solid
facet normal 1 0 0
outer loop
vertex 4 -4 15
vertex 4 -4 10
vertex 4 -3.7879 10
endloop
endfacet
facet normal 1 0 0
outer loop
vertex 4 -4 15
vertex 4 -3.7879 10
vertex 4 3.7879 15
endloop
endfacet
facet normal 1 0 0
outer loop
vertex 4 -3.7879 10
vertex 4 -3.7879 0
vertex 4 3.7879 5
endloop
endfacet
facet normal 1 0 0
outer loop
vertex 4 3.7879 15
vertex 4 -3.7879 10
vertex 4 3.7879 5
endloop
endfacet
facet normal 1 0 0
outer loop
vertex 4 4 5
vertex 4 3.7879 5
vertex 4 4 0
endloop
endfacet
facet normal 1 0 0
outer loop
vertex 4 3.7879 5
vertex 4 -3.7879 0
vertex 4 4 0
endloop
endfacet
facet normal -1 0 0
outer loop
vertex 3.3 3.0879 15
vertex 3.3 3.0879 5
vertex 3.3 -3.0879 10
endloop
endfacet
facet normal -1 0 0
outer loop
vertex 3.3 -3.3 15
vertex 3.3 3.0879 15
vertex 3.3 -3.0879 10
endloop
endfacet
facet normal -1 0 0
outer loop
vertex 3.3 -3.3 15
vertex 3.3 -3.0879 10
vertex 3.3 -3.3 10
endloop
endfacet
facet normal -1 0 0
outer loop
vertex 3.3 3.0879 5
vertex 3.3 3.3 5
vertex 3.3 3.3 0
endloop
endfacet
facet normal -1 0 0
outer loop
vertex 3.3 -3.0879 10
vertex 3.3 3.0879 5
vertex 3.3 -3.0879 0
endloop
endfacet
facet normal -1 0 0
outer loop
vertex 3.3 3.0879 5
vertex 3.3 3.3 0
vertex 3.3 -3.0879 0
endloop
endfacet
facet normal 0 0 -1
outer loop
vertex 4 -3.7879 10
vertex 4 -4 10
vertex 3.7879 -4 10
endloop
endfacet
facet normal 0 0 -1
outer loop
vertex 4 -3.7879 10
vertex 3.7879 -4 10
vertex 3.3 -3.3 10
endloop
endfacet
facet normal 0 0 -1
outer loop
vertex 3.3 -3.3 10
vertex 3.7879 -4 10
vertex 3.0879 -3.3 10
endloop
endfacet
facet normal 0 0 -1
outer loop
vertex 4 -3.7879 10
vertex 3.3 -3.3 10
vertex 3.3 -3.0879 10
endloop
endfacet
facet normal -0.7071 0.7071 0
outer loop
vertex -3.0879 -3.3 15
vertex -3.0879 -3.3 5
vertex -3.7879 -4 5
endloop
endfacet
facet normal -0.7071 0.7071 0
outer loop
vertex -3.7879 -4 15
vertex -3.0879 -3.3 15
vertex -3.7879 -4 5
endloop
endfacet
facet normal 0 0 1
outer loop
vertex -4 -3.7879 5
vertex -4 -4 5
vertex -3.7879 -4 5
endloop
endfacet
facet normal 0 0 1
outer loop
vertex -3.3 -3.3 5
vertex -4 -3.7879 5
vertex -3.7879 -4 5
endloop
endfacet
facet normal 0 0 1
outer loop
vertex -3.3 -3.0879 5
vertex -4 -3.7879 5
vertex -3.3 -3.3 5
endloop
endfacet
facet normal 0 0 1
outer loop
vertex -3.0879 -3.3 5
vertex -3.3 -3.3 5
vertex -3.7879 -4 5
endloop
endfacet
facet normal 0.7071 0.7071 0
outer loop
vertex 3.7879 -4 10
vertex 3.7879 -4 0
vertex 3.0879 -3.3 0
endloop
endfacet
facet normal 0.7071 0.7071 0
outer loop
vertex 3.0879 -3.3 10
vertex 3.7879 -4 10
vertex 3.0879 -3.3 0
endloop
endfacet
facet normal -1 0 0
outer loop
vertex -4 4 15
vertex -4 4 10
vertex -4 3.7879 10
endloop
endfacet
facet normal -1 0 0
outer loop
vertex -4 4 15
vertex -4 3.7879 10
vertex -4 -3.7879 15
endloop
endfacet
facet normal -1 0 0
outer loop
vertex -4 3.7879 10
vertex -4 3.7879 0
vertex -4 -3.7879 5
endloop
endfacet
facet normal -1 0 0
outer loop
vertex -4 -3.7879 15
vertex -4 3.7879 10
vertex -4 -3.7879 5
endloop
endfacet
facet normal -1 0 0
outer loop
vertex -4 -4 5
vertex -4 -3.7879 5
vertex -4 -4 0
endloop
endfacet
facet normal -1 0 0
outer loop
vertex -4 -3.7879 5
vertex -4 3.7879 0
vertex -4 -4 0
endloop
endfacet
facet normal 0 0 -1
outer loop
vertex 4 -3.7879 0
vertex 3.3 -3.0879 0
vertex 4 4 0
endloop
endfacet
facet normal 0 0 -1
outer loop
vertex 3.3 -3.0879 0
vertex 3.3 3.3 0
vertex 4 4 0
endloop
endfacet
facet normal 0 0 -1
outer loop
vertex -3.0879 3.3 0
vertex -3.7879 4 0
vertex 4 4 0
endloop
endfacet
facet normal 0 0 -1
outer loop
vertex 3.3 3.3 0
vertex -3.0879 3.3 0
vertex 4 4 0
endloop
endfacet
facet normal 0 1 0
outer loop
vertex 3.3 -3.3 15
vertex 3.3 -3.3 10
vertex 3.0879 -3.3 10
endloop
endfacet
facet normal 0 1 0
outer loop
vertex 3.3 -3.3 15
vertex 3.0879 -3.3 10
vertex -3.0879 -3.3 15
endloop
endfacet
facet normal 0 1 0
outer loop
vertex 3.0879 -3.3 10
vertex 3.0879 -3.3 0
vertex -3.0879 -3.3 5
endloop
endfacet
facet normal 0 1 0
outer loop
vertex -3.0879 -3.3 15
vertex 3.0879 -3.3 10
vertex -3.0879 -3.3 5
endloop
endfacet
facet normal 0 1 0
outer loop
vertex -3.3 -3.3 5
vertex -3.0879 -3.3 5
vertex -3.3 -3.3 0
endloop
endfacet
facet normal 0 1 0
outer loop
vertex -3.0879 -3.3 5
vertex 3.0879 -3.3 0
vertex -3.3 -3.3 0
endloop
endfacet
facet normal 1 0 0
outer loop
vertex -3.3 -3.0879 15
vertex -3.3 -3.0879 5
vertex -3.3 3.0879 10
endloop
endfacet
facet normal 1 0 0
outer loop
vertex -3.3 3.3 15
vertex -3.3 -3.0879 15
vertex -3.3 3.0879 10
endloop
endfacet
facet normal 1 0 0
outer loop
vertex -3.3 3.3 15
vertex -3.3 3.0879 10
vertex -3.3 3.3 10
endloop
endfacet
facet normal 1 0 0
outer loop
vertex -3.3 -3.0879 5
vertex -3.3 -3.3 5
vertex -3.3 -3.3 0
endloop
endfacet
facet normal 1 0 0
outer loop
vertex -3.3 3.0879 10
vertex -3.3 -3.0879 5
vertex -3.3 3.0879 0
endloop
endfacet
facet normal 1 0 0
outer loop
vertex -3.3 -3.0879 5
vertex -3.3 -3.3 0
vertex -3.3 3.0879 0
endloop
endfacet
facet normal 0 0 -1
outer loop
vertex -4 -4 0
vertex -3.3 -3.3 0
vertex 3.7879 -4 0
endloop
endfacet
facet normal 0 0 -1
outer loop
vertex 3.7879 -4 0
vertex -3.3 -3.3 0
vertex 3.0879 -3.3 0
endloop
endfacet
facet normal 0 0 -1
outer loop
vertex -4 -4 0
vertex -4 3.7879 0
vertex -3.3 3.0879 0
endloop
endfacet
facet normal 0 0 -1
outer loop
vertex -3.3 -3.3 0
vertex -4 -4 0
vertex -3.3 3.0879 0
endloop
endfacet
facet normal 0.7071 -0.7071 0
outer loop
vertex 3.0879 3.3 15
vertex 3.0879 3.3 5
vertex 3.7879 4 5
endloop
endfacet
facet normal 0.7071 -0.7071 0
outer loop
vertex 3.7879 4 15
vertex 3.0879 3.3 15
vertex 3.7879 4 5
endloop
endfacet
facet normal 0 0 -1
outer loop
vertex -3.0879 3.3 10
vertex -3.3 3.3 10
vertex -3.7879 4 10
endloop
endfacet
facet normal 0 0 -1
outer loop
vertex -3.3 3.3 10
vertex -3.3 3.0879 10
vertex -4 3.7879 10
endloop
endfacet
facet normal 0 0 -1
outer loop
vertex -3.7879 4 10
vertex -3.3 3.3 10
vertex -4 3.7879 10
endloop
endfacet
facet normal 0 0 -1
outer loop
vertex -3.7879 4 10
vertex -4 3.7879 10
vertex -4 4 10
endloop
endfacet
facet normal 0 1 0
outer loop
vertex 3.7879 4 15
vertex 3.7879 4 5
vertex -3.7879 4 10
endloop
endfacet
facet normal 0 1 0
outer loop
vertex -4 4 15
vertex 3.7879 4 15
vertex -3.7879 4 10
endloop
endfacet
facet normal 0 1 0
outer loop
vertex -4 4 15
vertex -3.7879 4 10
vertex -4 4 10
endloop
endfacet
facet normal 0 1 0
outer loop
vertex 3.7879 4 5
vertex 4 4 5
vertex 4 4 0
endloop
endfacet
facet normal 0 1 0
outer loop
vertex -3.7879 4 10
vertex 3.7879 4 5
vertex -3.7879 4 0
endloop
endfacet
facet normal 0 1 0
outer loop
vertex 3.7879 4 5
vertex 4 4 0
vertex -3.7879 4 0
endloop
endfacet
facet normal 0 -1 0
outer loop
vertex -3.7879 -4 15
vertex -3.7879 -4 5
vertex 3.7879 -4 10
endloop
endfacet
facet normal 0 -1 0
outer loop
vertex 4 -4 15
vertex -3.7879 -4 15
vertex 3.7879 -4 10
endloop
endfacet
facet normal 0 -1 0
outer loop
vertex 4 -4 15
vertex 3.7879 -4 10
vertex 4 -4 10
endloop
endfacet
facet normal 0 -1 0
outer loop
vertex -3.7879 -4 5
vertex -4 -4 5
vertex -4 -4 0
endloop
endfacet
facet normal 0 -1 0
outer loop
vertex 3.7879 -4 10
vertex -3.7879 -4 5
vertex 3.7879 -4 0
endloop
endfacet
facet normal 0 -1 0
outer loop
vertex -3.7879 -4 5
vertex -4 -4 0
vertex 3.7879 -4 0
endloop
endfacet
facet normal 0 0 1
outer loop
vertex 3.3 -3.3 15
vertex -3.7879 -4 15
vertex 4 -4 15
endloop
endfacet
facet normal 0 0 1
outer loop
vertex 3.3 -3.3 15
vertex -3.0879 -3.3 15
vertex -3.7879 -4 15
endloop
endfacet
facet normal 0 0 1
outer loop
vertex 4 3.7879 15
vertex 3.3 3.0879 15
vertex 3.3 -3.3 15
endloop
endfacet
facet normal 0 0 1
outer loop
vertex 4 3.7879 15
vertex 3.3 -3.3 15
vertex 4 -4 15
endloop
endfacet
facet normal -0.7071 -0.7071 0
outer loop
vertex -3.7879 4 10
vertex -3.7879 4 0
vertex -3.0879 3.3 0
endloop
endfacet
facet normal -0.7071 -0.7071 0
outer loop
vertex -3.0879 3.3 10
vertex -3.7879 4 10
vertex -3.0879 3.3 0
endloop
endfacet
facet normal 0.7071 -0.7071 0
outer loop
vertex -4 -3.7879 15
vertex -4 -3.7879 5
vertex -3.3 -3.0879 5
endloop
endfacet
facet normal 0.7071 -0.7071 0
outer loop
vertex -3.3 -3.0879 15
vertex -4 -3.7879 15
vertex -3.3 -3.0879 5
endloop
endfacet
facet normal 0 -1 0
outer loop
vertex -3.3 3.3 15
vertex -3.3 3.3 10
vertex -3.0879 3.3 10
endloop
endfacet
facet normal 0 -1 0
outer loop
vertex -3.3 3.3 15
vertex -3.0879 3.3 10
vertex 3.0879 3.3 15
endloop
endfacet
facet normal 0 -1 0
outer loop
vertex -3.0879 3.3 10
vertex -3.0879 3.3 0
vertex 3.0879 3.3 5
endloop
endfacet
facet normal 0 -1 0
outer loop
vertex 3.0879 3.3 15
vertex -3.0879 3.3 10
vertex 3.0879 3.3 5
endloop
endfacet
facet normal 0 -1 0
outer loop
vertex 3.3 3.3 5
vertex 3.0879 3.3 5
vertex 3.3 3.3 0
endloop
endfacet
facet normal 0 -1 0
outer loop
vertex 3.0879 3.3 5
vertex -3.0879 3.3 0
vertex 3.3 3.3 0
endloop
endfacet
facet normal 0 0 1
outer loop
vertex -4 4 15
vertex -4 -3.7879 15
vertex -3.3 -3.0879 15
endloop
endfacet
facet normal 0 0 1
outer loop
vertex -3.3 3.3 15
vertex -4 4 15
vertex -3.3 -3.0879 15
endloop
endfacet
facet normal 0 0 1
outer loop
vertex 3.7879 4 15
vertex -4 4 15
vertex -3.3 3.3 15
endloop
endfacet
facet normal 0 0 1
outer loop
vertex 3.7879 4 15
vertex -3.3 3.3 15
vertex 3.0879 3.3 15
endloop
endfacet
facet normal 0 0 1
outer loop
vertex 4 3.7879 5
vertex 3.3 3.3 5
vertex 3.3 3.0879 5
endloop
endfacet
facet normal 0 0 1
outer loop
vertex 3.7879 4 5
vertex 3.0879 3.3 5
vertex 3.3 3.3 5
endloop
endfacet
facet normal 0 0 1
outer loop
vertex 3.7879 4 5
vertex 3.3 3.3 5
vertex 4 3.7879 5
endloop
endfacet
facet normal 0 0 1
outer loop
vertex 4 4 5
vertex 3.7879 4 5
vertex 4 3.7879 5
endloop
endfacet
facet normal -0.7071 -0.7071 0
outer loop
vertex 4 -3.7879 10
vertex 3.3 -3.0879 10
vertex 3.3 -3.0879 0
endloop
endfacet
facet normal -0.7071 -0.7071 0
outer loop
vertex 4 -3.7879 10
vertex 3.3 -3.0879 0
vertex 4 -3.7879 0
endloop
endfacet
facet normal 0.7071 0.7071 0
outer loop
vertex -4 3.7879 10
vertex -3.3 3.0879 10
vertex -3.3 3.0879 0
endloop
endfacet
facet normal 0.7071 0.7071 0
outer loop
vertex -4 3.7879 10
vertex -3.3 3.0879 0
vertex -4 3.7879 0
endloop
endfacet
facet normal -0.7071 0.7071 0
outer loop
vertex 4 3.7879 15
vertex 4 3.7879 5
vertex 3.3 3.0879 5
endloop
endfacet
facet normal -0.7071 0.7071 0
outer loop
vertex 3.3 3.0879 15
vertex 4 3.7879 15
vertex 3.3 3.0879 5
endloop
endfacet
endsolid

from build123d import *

# Parameters (mm, degrees)
F1_DEPTH = 15
F2_DEPTH = 5
F4_ANGLE = 90


with BuildPart() as f1:
    # F0 (on Top) → F1 (new body)
    with BuildSketch(Plane.XY):
        Polygon((-4, 4), (-4, -3.7878679656), (-3.3, -3.0878679656), (-3.3, 3.3), (3.0878679656, 3.3), (3.7878679656, 4), align=None)
        Polygon((-3.7878679656, -4), (4, -4), (4, 3.7878679656), (3.3, 3.0878679656), (3.3, -3.3), (-3.0878679656, -3.3), align=None)
    extrude(amount=F1_DEPTH)

    # F0 (on Top) → F2 (join)
    with BuildSketch(Plane.XY):
        Polygon((-4, -4), (-3.7878679656, -4), (-3.0878679656, -3.3), (-3.3, -3.3), (-3.3, -3.0878679656), (-4, -3.7878679656), align=None)
        Polygon((3.3, 3.0878679656), (4, 3.7878679656), (4, 4), (3.7878679656, 4), (3.0878679656, 3.3), (3.3, 3.3), align=None)
    extrude(amount=F2_DEPTH)


with BuildPart() as f3_1:
    # F3: instance of F1
    add(f1.part.mirror(Plane(origin=(-1.8837940264, 1.8837940264, 15), x_dir=(1, 0, 0), z_dir=(0, 0, 1))))


with BuildPart() as f3_1_1:
    # F4: moved
    add(f3_1.part.rotate(Axis((4, -4, 22.5), (0, 0, 1)), F4_ANGLE))


with BuildPart() as f3_1_2:
    # F5: moved
    add(f3_1_1.part.moved(Location((0, 8, -15))))


with BuildPart() as f1_1:
    add(f1.part)

    # F6: intersect F3_1
    add(f3_1_2.part, mode=Mode.INTERSECT)


solid = f1_1.part
